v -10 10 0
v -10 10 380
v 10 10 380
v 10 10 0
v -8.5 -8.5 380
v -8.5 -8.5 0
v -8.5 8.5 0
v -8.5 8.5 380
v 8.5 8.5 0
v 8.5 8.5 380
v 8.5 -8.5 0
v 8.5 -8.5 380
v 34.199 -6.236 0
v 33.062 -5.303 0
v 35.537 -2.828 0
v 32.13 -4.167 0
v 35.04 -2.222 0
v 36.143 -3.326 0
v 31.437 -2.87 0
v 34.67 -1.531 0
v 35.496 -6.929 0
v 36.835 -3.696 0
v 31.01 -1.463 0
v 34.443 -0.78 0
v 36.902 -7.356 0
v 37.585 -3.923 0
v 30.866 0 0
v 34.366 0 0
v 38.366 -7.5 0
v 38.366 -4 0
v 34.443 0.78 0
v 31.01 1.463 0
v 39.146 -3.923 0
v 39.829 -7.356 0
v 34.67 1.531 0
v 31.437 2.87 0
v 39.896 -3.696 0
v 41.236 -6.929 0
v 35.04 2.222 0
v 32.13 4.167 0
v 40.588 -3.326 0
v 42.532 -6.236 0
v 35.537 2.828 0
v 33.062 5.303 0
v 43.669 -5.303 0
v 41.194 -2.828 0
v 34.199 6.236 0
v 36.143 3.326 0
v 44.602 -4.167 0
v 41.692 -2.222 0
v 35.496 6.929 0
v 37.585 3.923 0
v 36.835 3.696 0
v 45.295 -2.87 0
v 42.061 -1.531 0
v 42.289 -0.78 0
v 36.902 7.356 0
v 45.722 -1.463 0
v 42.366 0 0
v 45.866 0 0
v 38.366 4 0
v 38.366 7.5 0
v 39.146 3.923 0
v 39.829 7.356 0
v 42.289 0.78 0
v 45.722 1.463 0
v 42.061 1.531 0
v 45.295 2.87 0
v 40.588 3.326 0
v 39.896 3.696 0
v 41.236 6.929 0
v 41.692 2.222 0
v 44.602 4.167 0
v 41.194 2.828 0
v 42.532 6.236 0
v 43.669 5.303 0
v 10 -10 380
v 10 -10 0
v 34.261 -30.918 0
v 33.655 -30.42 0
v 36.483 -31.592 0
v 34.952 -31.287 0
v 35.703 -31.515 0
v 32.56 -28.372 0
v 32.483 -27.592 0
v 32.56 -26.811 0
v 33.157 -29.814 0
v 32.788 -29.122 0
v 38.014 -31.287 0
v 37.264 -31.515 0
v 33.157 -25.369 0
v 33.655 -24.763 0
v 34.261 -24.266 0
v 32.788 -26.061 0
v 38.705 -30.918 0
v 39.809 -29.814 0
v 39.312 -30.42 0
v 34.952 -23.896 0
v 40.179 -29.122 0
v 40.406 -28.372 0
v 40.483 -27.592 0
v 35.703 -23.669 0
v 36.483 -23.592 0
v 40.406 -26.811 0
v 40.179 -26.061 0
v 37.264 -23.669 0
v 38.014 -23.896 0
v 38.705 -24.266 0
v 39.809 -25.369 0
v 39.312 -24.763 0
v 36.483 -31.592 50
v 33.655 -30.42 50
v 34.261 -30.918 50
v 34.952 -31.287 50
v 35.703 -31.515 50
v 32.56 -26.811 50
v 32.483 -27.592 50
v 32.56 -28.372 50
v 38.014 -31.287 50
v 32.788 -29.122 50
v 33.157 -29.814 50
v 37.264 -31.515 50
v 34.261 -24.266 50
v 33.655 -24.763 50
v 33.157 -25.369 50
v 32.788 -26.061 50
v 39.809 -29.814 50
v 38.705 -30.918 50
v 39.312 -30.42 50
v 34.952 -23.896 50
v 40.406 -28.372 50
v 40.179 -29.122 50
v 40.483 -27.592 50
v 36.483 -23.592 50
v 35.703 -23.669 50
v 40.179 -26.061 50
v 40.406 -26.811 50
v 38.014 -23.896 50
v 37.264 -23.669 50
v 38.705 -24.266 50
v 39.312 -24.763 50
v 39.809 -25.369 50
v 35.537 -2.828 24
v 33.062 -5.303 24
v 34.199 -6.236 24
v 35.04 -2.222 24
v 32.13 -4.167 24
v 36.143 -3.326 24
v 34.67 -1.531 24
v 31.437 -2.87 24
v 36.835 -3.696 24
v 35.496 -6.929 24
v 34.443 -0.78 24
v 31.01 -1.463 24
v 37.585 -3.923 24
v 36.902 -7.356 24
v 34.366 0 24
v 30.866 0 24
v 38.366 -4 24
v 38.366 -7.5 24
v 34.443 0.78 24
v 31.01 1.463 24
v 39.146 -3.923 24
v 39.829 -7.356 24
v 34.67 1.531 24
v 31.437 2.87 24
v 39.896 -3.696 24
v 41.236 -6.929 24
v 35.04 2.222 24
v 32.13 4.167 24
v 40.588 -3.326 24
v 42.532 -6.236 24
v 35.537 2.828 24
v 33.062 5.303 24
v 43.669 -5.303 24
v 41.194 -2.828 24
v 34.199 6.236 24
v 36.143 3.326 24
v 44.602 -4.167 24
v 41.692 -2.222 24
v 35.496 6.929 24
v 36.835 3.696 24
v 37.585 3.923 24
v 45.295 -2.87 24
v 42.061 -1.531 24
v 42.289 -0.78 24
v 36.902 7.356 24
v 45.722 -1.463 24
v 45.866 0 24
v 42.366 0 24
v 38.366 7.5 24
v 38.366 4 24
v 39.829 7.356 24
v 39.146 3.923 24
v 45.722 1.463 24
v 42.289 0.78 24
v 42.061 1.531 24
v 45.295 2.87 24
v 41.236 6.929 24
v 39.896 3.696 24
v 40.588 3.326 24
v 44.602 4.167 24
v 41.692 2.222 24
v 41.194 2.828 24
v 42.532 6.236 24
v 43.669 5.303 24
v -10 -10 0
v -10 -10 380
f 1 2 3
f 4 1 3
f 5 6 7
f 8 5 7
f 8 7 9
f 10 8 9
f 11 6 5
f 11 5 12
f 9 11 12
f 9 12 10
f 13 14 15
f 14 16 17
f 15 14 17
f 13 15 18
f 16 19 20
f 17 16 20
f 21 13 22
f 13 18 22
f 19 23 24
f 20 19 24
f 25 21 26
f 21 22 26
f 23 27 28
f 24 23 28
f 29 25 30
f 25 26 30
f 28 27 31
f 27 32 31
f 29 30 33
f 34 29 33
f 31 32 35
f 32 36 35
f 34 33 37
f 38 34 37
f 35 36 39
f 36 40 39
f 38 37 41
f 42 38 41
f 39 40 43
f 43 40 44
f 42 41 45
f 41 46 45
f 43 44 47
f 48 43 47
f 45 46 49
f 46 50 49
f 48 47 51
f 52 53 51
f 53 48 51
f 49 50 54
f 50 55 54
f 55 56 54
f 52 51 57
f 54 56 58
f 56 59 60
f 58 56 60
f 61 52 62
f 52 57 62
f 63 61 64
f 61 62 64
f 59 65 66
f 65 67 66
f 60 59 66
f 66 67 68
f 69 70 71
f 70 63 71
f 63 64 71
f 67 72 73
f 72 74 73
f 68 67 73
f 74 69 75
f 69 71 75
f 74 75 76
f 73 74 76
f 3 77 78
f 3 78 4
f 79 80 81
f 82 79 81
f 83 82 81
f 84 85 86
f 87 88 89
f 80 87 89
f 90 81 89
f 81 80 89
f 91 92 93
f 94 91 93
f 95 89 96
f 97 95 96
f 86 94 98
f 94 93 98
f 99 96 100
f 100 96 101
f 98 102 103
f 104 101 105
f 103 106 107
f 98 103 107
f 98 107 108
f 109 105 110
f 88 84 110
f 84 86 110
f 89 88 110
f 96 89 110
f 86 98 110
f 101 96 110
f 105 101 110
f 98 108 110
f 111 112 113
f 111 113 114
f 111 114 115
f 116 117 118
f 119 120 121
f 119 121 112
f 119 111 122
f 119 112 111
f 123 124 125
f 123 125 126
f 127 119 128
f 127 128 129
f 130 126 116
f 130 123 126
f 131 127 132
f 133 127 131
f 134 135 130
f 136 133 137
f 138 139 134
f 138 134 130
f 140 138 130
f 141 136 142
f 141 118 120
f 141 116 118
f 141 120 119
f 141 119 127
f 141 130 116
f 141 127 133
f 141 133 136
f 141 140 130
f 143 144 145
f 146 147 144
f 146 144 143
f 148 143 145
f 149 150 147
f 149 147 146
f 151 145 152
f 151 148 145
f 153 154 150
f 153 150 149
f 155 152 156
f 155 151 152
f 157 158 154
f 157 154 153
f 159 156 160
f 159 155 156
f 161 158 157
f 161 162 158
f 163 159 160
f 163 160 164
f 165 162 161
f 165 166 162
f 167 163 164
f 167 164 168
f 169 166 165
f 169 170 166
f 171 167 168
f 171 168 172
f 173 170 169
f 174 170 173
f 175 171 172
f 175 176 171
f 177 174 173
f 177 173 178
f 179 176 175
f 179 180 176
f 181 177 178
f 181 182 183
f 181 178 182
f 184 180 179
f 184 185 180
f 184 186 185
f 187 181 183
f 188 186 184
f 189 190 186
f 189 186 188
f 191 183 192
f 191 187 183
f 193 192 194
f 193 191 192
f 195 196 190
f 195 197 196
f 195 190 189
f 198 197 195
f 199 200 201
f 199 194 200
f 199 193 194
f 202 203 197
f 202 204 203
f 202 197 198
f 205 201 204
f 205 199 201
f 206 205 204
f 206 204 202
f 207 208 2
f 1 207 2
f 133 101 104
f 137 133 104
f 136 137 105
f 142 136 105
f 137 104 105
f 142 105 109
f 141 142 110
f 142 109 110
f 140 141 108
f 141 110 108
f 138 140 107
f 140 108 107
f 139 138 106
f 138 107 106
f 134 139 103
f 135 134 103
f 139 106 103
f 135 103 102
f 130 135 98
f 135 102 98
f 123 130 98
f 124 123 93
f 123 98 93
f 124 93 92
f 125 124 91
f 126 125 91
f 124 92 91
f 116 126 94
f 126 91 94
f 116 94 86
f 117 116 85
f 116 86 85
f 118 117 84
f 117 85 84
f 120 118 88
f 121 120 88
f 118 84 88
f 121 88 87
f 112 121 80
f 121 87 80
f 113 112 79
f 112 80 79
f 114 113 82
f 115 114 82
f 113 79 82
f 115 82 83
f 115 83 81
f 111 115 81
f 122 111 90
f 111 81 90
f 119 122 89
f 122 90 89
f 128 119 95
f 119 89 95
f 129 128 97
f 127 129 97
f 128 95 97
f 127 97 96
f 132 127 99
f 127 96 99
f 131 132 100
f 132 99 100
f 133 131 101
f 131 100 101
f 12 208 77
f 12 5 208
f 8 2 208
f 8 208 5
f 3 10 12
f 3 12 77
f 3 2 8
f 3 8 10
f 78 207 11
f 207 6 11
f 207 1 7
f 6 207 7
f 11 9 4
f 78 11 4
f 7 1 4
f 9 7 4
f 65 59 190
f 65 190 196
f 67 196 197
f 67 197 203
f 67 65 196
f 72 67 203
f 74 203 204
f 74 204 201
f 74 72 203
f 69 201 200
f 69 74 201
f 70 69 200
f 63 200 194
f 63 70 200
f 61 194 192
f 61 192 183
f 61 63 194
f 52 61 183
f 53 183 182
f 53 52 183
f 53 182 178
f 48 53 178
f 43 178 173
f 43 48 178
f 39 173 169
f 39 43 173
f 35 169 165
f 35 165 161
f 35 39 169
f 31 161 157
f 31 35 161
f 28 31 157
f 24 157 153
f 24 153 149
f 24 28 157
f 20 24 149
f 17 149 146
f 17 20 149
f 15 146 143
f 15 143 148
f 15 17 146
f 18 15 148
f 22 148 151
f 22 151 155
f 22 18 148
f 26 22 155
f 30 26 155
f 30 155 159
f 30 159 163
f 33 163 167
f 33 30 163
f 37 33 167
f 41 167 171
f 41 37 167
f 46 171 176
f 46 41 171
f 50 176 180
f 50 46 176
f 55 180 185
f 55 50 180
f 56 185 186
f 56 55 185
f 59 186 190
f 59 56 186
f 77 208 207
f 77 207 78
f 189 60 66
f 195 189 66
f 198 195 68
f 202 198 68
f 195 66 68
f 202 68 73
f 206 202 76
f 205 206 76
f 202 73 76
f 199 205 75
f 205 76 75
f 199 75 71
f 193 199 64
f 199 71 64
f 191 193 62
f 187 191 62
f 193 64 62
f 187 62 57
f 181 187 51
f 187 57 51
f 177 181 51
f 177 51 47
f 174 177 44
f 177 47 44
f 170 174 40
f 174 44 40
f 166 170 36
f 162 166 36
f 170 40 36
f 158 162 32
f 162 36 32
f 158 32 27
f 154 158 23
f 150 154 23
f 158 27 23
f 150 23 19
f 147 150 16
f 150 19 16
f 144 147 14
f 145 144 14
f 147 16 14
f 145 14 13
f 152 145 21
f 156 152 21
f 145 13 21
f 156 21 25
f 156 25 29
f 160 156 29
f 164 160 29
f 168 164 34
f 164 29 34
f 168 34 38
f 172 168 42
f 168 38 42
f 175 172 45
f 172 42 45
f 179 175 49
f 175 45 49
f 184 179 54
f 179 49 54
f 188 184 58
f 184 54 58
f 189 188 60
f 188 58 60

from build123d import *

# Parameters (mm, degrees)
F0_W     = 20
F0_H     = 20
F0_W_2   = 17
F0_H_2   = 17
F1_DEPTH = 380
F2_R     = 7.5
F2_R_2   = 4
F3_DEPTH = 24
F4_R     = 4
F5_DEPTH = 50


with BuildPart() as f1:
    # F0 (on Top) → F1 (new body)
    with BuildSketch(Plane.XY):
        Rectangle(F0_W, F0_H)
        Rectangle(F0_W_2, F0_H_2, mode=Mode.SUBTRACT)
    extrude(amount=F1_DEPTH)


with BuildPart() as f3:
    # F2 (on Top) → F3 (new body)
    with BuildSketch(Plane.XY):
        with Locations((38.365666, 0)):
            Circle(F2_R)
        with Locations((38.365666, 0)):
            Circle(F2_R_2, mode=Mode.SUBTRACT)
    extrude(amount=F3_DEPTH)


with BuildPart() as f5:
    # F4 (on Top) → F5 (new body)
    with BuildSketch(Plane.XY):
        with Locations((36.483213, -27.591713)):
            Circle(F4_R)
    extrude(amount=F5_DEPTH)


solid = Compound([f1.part, f3.part, f5.part])
